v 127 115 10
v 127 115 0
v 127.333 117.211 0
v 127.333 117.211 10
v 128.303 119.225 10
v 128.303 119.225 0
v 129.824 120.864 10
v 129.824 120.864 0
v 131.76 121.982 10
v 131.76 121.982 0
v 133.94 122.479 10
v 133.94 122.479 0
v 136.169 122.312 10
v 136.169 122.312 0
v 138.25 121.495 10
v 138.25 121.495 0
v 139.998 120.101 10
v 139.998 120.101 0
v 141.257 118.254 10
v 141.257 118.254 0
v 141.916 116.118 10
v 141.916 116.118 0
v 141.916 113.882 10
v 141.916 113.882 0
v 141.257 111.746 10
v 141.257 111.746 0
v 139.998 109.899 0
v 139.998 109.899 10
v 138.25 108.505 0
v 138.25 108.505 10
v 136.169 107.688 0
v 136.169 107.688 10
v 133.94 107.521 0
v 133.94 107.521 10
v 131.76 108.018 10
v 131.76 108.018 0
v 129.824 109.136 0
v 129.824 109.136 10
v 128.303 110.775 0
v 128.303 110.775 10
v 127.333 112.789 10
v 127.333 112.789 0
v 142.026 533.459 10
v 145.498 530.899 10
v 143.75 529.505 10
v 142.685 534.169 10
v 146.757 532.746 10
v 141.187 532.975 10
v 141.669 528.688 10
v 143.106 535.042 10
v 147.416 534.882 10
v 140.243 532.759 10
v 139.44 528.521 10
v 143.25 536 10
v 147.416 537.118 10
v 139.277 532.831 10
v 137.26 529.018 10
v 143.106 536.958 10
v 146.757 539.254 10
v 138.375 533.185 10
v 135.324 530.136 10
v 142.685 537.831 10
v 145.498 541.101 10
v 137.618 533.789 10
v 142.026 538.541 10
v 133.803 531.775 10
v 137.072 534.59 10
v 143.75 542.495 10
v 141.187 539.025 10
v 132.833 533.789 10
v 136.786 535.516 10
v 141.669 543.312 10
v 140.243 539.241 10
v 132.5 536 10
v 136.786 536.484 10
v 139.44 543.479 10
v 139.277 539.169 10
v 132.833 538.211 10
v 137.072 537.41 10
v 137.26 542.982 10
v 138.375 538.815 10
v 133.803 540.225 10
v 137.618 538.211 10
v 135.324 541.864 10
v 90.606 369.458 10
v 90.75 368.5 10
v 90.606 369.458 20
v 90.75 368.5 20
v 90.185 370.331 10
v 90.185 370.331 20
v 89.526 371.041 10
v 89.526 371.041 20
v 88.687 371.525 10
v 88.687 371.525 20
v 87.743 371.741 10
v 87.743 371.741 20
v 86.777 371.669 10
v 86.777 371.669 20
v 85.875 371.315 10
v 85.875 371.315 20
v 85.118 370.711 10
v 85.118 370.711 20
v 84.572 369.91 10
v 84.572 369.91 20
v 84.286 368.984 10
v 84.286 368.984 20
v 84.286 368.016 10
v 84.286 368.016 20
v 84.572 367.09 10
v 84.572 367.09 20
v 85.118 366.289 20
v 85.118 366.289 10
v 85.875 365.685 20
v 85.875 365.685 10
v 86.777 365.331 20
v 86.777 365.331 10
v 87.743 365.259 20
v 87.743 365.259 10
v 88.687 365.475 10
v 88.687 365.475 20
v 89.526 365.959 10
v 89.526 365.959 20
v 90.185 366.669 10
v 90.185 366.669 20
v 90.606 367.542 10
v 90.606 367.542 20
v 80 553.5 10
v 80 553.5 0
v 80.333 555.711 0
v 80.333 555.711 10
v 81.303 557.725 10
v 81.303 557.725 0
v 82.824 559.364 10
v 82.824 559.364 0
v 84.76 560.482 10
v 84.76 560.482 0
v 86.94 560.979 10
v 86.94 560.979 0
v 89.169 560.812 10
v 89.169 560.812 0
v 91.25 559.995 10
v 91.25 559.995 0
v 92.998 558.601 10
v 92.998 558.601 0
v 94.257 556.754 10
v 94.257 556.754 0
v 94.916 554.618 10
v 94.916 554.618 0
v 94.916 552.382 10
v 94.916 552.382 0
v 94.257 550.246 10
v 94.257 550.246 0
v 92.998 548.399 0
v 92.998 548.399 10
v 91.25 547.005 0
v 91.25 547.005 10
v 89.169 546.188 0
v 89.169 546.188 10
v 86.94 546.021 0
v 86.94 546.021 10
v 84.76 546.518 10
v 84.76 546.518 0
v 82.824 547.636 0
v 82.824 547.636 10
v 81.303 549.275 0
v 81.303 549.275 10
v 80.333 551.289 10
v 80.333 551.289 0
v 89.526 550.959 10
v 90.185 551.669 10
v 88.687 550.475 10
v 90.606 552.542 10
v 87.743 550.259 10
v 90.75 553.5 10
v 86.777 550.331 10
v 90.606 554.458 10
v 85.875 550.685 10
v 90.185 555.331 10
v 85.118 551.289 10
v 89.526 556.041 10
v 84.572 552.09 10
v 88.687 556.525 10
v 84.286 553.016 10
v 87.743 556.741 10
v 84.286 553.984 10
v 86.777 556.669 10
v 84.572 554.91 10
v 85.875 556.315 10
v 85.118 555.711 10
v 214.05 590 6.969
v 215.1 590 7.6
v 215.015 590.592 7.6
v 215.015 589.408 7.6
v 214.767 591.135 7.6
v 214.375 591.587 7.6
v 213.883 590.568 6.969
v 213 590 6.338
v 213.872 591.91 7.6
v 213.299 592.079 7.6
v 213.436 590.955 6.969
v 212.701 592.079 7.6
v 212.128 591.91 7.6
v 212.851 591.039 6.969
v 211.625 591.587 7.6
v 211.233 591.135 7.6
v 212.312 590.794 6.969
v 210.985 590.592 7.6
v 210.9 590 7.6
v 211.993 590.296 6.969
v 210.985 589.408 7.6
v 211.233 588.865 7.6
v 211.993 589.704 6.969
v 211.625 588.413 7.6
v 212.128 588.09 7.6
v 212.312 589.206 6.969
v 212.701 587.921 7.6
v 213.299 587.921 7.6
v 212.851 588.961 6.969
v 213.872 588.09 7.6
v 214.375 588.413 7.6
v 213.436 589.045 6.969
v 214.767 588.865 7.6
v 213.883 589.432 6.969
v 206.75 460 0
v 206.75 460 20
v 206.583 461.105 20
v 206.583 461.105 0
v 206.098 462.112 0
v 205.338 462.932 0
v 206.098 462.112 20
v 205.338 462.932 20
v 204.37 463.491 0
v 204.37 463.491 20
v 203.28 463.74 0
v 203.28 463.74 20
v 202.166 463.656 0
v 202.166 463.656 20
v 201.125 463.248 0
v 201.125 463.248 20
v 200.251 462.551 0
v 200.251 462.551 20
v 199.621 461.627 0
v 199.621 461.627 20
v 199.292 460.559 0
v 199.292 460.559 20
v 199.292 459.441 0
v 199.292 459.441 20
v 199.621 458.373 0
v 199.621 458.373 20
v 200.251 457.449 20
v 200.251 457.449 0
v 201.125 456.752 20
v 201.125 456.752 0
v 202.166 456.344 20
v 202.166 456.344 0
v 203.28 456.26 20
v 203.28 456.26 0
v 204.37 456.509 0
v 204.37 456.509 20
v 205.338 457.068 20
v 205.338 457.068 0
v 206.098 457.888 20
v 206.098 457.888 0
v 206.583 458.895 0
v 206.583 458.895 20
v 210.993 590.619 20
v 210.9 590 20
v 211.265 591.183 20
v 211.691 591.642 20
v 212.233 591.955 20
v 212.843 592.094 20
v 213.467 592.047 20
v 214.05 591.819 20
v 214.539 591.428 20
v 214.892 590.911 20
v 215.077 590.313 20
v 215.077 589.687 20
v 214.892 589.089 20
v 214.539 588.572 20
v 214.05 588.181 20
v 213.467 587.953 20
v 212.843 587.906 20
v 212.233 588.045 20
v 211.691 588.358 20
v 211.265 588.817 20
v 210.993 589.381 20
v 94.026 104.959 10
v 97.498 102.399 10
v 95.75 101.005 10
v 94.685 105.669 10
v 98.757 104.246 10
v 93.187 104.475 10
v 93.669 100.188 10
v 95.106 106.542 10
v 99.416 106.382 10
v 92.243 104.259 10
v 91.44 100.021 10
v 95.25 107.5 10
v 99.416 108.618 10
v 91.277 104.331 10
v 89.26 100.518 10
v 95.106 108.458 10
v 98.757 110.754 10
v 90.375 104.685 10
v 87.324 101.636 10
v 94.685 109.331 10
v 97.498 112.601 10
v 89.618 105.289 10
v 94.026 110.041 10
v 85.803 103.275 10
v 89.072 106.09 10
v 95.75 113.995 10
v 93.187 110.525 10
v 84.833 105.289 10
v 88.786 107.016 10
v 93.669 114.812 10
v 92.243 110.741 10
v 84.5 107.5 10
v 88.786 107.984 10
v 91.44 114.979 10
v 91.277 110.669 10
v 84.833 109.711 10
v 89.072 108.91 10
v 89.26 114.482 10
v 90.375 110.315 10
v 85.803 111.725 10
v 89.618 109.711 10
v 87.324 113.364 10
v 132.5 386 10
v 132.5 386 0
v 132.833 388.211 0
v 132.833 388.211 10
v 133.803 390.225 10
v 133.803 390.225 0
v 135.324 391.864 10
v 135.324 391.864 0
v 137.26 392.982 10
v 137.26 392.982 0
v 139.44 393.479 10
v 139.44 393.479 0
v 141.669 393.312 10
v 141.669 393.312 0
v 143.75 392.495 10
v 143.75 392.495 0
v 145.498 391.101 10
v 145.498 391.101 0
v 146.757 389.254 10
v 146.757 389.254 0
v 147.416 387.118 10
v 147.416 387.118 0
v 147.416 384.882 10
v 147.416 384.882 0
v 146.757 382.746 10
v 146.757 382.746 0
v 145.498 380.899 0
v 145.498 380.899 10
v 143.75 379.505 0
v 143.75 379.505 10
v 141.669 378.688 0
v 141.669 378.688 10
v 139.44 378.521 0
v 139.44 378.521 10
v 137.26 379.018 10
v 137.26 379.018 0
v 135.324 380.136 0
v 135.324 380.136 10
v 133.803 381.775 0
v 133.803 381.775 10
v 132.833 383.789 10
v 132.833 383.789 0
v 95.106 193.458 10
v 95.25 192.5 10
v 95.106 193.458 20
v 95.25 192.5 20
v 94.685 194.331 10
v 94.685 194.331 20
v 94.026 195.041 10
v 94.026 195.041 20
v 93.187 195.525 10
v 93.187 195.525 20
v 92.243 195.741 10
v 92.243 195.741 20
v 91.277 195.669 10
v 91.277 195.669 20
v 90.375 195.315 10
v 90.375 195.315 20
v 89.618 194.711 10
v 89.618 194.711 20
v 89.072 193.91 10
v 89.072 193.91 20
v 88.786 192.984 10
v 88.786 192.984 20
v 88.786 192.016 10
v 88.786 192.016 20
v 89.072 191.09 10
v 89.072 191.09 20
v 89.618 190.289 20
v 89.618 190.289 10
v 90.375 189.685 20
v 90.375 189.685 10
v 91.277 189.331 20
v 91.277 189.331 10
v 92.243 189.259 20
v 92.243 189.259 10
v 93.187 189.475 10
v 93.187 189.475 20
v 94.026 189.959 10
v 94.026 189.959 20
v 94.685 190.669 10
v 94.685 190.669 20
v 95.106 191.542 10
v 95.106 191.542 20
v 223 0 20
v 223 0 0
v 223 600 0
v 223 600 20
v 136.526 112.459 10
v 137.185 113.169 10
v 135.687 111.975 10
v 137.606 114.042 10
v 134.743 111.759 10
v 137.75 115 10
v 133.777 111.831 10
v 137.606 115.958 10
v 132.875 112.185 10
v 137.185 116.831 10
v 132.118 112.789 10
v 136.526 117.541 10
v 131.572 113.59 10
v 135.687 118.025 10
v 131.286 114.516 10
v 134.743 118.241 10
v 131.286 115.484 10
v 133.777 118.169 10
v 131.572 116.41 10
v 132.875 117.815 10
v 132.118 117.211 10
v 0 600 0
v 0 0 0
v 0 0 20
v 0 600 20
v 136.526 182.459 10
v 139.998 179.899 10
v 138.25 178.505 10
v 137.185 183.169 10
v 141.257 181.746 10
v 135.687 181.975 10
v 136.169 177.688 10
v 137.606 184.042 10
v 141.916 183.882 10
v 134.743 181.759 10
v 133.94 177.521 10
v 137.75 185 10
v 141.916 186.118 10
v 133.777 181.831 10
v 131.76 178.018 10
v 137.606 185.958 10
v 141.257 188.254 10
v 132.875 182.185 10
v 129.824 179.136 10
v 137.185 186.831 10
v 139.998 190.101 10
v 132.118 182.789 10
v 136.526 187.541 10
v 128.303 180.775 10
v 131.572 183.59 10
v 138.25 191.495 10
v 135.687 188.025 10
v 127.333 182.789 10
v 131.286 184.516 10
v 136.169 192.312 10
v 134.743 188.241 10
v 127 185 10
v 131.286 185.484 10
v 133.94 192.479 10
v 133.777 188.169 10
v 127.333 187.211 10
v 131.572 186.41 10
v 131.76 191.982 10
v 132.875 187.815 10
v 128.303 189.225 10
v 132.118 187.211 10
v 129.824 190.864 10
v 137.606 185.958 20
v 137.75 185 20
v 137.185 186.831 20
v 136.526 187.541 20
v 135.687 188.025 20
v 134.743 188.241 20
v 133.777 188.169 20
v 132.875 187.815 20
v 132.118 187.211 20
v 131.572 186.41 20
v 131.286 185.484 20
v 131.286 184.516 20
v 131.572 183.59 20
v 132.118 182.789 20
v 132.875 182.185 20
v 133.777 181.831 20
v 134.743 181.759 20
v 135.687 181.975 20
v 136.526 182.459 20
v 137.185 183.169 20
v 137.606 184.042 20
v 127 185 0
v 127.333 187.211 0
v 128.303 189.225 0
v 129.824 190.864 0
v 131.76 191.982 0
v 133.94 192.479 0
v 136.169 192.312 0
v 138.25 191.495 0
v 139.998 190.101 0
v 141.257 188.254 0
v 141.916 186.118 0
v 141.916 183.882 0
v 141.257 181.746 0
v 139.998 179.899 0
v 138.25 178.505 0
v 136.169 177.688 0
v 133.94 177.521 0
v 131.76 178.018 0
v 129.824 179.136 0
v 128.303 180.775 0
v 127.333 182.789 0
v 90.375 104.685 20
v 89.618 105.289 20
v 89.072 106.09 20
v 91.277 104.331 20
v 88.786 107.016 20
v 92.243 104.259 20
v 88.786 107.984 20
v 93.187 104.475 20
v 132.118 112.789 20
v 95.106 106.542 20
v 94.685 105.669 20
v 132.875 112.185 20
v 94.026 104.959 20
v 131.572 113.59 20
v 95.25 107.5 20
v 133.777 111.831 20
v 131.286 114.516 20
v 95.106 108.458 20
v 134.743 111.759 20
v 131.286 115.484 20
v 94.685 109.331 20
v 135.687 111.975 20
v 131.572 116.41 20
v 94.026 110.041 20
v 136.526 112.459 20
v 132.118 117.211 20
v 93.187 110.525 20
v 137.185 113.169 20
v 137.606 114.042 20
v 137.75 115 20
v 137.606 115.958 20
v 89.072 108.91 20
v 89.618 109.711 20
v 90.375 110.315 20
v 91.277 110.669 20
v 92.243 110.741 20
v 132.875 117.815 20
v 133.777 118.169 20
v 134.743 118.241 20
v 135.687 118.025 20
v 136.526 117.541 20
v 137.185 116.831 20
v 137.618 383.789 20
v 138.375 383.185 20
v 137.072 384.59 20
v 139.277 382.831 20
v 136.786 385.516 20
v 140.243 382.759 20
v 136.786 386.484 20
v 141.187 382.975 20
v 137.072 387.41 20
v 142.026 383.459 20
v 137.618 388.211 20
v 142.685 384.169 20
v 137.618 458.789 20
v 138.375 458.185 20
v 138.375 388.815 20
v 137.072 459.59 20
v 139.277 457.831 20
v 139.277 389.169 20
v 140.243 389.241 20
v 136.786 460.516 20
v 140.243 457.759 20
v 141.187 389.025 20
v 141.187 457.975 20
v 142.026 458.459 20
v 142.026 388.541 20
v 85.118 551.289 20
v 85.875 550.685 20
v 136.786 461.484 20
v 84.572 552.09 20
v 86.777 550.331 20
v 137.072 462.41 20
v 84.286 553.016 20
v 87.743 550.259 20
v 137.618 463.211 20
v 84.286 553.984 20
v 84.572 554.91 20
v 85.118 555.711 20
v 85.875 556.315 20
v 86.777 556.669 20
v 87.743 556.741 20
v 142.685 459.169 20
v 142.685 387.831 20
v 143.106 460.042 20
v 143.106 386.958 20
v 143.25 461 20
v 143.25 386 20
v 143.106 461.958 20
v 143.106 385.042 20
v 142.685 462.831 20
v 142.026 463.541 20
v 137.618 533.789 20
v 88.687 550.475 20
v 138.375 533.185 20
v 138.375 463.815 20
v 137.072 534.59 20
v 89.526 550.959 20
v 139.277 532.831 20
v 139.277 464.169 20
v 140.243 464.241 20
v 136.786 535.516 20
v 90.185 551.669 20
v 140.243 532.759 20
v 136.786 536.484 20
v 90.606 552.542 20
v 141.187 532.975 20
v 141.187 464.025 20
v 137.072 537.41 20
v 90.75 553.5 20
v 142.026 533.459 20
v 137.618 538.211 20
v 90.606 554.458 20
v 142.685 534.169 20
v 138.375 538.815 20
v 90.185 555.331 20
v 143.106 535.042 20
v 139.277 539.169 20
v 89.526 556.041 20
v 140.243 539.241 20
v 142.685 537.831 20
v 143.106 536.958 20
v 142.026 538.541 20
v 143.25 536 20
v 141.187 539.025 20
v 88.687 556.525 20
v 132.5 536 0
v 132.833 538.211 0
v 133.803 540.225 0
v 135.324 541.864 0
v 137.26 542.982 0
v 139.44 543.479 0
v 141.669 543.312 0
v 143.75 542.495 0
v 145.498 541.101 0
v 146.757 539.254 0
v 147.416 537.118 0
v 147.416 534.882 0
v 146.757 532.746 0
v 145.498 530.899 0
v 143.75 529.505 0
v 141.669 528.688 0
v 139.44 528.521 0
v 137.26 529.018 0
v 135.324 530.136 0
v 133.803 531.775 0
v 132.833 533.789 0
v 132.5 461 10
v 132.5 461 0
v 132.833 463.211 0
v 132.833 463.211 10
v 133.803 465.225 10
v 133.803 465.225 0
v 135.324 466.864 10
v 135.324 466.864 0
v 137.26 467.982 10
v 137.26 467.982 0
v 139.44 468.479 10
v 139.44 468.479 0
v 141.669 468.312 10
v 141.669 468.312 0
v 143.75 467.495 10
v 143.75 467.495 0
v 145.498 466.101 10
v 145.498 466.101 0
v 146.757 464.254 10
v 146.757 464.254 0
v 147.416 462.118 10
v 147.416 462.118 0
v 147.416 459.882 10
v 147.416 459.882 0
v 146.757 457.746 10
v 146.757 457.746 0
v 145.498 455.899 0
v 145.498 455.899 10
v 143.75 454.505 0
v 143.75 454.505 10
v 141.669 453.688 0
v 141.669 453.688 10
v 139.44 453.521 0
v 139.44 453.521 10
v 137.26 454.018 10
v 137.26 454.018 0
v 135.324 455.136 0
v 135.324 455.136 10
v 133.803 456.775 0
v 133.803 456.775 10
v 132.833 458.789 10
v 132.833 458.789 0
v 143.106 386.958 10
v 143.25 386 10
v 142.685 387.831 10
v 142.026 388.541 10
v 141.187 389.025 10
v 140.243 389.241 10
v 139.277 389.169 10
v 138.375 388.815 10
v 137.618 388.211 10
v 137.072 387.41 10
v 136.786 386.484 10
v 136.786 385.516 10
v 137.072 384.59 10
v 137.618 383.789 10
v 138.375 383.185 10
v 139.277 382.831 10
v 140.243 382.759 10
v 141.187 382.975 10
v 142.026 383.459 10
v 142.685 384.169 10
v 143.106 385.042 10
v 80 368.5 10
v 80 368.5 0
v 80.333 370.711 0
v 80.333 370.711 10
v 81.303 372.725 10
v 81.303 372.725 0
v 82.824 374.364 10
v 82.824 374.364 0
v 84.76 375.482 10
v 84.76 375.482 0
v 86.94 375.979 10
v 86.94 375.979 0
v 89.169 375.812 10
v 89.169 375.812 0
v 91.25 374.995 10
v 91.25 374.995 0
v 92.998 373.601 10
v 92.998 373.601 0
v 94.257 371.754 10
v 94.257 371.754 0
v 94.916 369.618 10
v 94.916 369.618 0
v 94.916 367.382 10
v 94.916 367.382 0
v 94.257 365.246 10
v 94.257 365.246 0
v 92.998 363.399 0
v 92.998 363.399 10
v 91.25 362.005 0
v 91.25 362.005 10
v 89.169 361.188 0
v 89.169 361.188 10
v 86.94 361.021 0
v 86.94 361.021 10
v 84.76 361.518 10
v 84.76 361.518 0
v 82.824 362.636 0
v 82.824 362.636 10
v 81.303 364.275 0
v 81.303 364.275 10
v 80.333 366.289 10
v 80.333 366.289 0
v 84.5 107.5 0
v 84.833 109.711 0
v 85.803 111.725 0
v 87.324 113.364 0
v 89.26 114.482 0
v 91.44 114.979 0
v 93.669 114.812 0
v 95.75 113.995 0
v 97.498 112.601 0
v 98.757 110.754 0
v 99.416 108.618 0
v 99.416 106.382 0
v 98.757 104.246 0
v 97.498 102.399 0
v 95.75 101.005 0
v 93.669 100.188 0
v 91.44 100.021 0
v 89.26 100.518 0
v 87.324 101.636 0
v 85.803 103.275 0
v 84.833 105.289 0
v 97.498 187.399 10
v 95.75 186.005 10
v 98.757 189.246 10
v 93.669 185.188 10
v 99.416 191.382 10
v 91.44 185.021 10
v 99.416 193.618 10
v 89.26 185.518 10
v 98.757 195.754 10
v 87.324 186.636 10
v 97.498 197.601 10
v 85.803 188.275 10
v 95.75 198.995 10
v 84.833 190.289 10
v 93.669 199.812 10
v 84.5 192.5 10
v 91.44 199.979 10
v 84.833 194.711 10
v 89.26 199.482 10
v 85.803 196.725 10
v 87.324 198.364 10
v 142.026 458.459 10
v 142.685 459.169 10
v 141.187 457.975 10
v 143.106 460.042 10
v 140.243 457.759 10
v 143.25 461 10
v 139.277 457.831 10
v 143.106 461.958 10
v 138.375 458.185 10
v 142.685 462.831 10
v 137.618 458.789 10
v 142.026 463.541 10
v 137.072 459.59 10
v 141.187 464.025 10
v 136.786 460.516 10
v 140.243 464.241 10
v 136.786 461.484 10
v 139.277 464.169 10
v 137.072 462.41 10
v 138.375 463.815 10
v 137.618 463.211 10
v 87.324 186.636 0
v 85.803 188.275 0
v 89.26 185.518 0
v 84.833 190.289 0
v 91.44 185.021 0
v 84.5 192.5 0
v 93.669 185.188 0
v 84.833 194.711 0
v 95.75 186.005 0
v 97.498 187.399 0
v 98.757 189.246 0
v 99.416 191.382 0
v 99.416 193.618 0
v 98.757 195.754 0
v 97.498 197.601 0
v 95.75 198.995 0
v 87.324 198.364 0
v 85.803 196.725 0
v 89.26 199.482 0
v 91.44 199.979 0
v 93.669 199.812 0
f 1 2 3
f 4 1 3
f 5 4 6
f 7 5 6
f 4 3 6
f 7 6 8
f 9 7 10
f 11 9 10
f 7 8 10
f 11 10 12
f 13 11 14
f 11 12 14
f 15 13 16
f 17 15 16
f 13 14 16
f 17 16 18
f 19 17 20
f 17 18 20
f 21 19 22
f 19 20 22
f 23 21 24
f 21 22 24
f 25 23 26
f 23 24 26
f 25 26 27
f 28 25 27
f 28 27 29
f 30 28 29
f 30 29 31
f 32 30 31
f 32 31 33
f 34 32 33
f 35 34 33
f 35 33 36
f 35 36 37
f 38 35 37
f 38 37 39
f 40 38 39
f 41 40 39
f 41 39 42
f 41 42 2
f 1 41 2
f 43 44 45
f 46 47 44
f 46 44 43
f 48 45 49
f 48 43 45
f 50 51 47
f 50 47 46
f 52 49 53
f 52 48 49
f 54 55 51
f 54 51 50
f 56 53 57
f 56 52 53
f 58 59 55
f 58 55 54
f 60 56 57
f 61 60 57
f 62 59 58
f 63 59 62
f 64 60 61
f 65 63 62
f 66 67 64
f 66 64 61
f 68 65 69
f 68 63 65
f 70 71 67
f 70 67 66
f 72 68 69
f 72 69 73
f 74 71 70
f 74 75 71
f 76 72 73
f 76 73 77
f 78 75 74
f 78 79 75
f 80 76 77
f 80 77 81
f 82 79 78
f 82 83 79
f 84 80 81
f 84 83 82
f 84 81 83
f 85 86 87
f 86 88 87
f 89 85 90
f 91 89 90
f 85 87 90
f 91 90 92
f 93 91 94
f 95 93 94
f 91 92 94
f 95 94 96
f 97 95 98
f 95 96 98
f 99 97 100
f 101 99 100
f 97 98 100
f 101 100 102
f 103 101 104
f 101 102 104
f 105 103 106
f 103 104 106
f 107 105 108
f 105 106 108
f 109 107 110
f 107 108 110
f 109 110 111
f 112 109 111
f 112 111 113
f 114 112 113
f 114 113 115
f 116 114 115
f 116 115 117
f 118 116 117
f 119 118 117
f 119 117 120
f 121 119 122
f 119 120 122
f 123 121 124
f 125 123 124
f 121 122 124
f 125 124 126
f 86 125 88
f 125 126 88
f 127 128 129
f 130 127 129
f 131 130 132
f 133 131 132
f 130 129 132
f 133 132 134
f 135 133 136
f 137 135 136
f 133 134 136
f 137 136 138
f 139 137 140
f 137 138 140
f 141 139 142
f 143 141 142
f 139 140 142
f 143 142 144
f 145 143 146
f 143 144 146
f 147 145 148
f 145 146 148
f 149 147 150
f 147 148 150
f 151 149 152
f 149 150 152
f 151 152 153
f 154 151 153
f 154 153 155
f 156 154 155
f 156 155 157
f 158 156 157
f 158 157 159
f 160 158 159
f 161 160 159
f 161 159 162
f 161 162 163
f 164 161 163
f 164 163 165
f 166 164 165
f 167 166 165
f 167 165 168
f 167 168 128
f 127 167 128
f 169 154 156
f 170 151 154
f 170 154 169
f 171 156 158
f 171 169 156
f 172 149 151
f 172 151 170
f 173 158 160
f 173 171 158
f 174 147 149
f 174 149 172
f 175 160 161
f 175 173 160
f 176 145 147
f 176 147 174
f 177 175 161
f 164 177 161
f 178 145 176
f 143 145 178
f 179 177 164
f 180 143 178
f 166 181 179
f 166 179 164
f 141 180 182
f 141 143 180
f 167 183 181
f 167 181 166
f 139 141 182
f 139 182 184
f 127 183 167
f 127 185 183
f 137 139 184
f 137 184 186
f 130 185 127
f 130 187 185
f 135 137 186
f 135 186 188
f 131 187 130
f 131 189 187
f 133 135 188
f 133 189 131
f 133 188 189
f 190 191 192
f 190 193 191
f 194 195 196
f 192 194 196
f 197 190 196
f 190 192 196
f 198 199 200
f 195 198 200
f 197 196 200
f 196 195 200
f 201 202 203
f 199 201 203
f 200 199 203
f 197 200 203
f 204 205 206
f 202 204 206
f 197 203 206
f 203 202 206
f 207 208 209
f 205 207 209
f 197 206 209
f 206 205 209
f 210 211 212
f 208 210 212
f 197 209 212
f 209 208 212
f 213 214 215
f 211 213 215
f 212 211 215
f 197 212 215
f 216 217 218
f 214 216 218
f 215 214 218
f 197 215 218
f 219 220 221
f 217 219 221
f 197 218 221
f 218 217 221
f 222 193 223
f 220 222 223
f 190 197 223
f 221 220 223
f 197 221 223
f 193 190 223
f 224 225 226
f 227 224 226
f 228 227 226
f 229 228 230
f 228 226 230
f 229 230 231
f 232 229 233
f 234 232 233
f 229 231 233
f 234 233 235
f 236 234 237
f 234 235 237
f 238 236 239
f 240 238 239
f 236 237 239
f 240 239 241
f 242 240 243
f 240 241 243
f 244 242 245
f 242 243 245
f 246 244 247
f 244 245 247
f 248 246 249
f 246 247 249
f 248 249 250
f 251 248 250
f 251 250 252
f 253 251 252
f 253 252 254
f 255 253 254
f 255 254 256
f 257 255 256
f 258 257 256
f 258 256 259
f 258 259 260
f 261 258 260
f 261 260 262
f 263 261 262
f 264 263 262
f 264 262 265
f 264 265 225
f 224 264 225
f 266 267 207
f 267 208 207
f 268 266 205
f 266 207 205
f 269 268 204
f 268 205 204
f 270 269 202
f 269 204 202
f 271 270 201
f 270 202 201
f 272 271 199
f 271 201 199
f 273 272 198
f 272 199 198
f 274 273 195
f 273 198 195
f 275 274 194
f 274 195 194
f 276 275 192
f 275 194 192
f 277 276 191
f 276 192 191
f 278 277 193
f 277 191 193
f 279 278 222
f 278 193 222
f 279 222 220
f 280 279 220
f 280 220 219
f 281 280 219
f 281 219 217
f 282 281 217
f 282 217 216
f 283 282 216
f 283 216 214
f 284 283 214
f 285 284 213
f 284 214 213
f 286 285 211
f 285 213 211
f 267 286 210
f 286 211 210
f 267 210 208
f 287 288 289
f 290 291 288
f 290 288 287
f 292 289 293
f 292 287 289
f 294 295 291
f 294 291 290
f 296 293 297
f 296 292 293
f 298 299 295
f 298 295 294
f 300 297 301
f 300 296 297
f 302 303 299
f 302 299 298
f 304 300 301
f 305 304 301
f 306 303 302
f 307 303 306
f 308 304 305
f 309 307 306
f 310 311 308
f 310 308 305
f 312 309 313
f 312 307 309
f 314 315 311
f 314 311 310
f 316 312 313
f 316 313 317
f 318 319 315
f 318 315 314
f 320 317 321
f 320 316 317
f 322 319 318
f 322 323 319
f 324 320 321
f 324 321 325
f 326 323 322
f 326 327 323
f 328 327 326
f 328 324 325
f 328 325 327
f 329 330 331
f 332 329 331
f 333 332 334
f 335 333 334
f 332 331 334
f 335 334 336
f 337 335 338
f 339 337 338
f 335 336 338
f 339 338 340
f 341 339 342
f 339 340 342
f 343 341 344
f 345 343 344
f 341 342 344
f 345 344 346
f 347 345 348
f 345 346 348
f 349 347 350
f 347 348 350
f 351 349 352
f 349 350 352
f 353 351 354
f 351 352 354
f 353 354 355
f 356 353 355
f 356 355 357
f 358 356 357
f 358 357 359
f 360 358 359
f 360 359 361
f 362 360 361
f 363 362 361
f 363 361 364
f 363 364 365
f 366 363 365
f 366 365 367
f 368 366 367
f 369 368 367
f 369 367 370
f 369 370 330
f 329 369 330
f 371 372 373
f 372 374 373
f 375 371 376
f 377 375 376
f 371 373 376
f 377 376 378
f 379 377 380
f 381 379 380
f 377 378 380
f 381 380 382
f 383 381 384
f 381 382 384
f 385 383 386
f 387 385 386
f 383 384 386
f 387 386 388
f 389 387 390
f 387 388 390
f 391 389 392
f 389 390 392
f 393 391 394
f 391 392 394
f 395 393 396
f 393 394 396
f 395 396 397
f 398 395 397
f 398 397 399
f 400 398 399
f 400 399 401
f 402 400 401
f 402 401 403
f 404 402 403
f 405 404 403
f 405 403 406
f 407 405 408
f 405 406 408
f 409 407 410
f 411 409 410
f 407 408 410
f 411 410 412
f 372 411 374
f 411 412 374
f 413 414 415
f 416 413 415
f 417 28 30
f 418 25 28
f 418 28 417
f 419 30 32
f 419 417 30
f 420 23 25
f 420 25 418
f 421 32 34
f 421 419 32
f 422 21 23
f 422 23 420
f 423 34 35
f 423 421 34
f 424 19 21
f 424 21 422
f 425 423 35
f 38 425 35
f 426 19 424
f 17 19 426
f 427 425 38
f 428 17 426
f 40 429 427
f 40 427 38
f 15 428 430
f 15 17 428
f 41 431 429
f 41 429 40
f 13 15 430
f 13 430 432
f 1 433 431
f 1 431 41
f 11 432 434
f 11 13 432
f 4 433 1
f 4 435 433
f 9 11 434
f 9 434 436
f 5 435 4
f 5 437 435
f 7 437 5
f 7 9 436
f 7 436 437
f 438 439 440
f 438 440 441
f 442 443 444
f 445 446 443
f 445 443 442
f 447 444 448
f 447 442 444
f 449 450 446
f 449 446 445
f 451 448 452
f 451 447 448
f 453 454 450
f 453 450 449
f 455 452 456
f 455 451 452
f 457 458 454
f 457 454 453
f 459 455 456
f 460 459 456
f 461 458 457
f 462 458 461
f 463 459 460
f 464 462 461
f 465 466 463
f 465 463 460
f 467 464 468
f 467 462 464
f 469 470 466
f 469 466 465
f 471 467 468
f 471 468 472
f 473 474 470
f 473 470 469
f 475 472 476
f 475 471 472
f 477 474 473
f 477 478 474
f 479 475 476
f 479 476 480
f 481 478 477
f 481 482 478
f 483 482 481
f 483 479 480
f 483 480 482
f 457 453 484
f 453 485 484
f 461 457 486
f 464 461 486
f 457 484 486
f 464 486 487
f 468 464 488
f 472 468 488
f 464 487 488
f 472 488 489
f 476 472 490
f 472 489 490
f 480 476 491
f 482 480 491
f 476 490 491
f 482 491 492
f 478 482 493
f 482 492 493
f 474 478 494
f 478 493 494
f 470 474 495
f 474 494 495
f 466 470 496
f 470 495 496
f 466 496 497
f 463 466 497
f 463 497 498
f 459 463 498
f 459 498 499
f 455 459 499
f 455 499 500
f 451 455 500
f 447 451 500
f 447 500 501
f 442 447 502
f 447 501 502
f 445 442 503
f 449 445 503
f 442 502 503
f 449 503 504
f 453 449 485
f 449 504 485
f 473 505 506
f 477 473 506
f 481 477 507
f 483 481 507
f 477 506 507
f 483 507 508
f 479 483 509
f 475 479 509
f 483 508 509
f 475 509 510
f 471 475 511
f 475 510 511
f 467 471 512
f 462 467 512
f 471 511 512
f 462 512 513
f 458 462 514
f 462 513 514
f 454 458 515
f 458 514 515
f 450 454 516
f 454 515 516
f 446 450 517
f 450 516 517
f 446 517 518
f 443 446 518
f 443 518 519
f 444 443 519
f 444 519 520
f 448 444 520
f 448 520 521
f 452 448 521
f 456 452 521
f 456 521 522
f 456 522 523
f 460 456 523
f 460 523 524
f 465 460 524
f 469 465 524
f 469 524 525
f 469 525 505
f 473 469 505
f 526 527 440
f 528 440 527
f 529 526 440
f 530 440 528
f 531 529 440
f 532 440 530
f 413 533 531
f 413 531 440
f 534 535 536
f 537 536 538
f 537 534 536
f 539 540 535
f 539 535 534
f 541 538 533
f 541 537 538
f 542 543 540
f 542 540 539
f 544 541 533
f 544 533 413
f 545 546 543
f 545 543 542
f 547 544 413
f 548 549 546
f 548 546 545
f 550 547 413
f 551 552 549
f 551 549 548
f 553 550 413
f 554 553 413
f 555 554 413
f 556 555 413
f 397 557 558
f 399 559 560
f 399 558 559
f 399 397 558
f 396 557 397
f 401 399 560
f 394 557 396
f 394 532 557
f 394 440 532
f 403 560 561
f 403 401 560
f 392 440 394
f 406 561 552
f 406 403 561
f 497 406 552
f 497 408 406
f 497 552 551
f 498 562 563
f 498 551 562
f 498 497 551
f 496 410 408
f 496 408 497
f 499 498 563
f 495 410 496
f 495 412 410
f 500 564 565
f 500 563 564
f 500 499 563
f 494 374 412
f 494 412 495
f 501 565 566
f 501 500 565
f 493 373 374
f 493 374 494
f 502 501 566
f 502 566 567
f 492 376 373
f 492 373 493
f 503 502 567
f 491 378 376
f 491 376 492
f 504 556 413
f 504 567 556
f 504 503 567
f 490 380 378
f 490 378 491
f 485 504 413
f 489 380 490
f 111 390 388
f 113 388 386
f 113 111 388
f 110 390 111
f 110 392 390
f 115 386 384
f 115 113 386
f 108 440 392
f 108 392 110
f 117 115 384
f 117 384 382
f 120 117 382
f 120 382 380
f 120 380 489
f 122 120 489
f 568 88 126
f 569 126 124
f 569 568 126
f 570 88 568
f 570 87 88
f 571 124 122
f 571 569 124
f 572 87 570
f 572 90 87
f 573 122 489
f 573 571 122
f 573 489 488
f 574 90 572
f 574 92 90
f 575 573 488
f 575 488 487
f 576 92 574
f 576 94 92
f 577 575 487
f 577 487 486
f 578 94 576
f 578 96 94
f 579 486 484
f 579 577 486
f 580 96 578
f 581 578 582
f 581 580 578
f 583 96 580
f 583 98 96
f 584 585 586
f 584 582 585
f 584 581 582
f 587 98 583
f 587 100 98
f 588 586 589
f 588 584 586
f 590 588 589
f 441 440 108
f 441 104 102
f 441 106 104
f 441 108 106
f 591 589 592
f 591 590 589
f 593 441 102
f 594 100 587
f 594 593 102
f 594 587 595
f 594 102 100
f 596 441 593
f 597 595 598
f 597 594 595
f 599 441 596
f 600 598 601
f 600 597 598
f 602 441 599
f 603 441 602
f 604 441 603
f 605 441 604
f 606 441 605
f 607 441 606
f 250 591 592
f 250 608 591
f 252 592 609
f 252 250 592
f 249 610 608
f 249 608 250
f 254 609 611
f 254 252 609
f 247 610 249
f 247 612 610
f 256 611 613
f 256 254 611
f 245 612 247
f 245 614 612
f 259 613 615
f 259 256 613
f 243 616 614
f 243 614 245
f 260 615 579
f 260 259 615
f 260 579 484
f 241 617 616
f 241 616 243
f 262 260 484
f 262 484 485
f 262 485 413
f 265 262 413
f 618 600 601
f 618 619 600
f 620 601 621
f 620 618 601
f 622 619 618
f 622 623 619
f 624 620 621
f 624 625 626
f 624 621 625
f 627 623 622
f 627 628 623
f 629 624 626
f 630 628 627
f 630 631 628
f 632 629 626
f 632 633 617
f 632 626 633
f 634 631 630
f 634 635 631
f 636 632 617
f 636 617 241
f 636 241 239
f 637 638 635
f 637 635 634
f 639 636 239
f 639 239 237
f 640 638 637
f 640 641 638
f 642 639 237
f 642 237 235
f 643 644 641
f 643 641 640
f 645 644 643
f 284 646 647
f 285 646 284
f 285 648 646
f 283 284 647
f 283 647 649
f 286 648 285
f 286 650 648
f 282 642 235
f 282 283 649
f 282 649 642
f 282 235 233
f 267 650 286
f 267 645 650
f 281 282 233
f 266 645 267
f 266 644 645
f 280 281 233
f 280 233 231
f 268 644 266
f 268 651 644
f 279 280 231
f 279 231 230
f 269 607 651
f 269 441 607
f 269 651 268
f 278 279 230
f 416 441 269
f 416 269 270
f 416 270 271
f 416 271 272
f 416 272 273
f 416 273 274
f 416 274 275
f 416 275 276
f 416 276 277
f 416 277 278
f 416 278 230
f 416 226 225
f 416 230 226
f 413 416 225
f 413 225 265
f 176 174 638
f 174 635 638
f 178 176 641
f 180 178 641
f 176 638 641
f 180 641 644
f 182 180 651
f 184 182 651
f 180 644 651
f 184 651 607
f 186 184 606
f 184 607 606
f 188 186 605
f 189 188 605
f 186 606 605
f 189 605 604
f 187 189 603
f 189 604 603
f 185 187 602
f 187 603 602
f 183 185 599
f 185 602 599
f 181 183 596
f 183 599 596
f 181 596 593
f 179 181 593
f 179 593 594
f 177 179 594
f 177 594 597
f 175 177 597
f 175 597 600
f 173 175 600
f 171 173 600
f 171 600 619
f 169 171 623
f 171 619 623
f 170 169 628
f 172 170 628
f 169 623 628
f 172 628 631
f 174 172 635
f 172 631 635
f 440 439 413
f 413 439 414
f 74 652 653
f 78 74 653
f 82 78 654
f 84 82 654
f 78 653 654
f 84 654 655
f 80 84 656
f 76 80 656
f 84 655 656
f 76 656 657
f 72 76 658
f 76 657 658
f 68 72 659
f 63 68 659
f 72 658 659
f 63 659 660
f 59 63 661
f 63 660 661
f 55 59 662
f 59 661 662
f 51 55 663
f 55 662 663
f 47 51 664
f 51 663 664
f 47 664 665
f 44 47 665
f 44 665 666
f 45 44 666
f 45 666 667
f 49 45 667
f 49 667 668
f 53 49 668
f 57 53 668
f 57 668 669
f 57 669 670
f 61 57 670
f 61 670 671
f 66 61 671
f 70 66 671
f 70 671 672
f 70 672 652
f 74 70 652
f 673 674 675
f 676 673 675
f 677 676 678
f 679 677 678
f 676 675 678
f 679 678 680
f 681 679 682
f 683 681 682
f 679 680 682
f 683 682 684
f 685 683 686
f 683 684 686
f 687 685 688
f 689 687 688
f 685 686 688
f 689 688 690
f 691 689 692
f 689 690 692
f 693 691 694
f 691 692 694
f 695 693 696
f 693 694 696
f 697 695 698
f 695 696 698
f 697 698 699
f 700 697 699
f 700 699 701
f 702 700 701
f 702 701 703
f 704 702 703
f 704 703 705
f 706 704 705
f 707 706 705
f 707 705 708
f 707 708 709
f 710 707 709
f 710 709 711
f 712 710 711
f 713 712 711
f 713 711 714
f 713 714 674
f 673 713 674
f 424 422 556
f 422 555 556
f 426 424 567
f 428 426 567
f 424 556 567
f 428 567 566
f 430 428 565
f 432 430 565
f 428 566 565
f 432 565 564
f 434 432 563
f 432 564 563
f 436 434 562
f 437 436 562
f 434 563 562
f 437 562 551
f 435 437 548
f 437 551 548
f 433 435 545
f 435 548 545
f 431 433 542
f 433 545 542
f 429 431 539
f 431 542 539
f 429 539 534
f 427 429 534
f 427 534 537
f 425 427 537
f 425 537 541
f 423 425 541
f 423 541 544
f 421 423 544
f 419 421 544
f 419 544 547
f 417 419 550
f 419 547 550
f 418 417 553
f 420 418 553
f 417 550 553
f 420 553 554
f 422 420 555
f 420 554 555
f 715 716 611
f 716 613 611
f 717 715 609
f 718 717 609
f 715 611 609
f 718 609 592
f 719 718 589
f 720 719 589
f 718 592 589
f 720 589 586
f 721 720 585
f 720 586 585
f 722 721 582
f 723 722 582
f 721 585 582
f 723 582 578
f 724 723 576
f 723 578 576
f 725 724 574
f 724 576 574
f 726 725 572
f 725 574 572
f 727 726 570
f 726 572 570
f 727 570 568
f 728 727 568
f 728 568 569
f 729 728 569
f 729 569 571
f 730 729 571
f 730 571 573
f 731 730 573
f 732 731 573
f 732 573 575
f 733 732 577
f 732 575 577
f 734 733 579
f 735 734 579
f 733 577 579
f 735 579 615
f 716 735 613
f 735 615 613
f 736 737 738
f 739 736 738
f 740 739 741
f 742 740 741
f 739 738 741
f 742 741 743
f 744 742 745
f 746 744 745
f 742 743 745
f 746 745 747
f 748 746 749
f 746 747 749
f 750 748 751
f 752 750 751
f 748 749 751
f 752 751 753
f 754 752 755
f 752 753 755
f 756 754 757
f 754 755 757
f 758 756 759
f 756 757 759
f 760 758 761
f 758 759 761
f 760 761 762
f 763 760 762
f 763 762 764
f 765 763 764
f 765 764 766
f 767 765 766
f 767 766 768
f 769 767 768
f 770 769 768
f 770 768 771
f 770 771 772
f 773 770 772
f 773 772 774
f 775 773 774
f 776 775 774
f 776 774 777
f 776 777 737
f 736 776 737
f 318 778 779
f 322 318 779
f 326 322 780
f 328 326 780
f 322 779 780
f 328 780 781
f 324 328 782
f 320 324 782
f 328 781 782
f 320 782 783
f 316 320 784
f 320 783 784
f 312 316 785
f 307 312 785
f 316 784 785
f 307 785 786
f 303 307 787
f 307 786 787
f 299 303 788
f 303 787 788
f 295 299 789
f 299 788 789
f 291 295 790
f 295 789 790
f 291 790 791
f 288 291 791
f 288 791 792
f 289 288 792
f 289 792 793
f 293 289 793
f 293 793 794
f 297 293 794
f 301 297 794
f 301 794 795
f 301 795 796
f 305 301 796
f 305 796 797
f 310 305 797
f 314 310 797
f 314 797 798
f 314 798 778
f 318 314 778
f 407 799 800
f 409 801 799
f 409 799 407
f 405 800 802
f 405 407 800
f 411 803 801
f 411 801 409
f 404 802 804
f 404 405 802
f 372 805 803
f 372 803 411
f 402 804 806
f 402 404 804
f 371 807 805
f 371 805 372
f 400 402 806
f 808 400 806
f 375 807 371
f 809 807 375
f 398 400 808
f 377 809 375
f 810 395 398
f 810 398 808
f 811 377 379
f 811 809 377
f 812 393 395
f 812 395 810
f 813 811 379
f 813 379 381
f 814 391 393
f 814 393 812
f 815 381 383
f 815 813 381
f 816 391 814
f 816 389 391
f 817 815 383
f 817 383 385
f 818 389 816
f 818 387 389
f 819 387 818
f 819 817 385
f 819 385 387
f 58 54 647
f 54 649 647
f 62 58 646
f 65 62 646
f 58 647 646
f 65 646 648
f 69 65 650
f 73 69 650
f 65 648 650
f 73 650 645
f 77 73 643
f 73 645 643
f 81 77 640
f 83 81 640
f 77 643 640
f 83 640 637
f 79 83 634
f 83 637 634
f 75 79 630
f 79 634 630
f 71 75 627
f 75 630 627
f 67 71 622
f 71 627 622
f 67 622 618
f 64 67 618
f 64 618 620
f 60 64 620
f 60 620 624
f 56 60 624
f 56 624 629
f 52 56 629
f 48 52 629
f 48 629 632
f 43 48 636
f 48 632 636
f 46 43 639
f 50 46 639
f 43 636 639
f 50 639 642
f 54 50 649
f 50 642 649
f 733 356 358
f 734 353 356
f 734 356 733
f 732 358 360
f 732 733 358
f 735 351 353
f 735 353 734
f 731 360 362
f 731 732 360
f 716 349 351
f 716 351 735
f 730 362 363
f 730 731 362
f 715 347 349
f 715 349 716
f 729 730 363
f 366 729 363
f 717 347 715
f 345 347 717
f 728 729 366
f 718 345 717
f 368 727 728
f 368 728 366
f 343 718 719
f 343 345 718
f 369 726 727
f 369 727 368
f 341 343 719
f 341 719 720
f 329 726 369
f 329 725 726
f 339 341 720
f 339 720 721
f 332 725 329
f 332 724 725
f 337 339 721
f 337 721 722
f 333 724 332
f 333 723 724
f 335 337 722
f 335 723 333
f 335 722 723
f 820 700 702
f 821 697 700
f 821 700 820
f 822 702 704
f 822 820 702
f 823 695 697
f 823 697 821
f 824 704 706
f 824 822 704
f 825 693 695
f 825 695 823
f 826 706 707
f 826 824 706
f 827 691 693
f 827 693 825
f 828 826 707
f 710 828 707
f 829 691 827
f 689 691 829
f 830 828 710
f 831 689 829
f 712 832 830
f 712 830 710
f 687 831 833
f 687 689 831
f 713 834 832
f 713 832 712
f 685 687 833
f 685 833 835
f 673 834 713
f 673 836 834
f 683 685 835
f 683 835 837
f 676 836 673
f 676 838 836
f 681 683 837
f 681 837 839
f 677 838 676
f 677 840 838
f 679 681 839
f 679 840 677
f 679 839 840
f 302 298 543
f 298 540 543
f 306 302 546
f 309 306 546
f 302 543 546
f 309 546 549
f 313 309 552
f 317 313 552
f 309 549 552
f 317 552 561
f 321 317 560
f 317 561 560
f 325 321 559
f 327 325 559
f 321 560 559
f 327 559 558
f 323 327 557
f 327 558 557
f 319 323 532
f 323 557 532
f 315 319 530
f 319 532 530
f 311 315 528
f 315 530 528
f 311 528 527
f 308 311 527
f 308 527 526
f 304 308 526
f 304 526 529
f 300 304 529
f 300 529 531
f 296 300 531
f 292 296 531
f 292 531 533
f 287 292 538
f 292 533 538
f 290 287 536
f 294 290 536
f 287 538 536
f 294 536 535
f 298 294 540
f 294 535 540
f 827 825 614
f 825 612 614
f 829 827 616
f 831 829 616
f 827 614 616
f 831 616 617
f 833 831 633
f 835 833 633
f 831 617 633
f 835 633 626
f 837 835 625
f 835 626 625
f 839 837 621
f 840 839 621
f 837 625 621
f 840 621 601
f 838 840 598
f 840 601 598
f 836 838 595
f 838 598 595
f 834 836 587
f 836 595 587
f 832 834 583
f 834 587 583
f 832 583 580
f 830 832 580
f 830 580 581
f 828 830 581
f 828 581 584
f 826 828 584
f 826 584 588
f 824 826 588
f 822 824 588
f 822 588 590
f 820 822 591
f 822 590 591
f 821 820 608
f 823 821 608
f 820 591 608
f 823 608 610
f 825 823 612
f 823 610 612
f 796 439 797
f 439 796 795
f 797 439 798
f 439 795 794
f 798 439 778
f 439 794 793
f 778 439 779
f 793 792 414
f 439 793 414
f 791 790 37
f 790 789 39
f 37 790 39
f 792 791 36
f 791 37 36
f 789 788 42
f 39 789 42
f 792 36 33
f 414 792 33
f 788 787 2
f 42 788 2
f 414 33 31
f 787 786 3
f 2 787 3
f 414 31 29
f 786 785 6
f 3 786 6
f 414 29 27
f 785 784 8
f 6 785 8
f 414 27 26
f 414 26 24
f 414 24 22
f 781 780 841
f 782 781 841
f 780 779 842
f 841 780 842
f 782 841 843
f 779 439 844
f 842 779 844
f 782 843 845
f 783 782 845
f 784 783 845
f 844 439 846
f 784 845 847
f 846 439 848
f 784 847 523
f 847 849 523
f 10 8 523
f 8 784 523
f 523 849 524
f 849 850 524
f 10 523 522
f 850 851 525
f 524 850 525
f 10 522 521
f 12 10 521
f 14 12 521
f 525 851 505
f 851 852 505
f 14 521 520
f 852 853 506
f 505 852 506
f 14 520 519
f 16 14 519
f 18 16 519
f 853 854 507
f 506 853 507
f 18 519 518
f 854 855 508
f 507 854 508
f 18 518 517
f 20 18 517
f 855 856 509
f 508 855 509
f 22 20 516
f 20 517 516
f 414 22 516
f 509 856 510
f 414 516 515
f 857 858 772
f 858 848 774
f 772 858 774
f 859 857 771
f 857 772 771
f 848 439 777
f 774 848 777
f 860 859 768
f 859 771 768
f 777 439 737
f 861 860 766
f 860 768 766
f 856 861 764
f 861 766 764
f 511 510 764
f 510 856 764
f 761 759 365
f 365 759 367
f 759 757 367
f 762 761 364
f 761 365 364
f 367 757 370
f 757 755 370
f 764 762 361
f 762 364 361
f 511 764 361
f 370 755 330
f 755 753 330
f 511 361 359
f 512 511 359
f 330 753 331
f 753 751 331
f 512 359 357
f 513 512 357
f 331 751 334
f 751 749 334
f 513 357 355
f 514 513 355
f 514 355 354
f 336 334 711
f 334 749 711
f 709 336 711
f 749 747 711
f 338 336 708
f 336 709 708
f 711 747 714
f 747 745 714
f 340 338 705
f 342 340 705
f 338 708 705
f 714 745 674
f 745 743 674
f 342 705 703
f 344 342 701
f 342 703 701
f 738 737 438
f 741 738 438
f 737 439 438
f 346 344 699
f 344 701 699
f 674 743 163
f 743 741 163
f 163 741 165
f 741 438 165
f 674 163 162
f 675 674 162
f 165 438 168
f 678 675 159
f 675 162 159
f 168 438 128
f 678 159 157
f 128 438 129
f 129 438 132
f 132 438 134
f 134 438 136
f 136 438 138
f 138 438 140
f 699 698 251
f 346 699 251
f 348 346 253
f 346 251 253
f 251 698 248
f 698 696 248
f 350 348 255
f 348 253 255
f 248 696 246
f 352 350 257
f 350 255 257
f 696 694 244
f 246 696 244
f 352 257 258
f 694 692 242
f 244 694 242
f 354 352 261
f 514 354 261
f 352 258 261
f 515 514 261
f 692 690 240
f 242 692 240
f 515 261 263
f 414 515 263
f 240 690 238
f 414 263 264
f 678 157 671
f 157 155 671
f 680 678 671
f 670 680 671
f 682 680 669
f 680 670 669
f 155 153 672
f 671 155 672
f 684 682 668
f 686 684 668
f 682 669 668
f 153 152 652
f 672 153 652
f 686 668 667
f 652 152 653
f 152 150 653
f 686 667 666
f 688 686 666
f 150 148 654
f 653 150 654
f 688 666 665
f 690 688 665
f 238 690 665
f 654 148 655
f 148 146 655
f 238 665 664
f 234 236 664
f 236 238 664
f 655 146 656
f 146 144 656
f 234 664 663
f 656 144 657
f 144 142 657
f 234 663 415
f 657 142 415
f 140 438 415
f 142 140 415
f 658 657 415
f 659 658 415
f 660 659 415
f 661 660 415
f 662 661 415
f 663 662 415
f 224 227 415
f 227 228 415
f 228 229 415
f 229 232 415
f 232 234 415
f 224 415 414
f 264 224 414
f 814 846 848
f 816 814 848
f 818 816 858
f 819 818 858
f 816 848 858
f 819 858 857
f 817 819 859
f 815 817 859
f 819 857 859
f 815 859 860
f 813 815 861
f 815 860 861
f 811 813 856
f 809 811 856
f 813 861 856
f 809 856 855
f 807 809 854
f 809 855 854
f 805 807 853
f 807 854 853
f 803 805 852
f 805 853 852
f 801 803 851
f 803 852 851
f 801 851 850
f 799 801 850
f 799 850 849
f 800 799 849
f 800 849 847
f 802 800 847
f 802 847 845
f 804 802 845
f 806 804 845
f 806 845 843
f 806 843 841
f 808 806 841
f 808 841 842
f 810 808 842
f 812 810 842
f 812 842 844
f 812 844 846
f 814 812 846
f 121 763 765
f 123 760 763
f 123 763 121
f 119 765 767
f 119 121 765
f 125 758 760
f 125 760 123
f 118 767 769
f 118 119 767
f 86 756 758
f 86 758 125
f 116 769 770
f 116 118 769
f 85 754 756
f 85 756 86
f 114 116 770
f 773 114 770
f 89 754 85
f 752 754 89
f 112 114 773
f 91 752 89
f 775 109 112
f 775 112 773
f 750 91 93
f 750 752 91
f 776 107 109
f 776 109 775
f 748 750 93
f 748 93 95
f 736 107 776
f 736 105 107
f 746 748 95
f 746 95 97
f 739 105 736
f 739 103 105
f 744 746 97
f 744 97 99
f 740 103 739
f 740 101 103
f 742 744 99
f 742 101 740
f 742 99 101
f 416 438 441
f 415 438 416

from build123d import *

# Parameters (mm, degrees)
SKETCH1_W                                           = 223
SKETCH1_H                                           = 600
BOSS_EXTRUDE1_DEPTH                                 = 20
CBORE_FOR_M6_HEX_SOCKET_HEAD_CAP_SCREW1_D           = 6.5
CBORE_FOR_M6_HEX_SOCKET_HEAD_CAP_SCREW1_CBORE_D     = 15
CBORE_FOR_M6_HEX_SOCKET_HEAD_CAP_SCREW1_CBORE_DEPTH = 10
CBORE_FOR_M6_HEX_SOCKET_HEAD_CAP_SCREW2_D           = 6.5
CBORE_FOR_M6_HEX_SOCKET_HEAD_CAP_SCREW2_CBORE_D     = 15
CBORE_FOR_M6_HEX_SOCKET_HEAD_CAP_SCREW2_CBORE_DEPTH = 10
SKETCH6_R                                           = 3.75
CUT_EXTRUDE1_DEPTH                                  = 641.413147898
M5_TAPPED_HOLE1_D                                   = 4.2
M5_TAPPED_HOLE1_DEPTH                               = 12.4
M5_TAPPED_HOLE1_TIP                                 = 1.2618073


with BuildPart() as part:
    # Sketch1 → Boss-Extrude1 (new body)
    with BuildSketch(Plane.XY):
        with Locations((111.5, 300)):
            Rectangle(SKETCH1_W, SKETCH1_H)
    extrude(amount=BOSS_EXTRUDE1_DEPTH)

    # CBORE for M6 Hex Socket Head Cap Screw1 (through all)
    with Locations(Plane(origin=(0, 0, 0), x_dir=(-1, 0, 0), z_dir=(0, 0, -1))):
        with Locations((-134.5, 115), (-134.5, 185), (-92, 107.5), (-92, 192.5)):
            CounterBoreHole(CBORE_FOR_M6_HEX_SOCKET_HEAD_CAP_SCREW1_D / 2, CBORE_FOR_M6_HEX_SOCKET_HEAD_CAP_SCREW1_CBORE_D / 2, CBORE_FOR_M6_HEX_SOCKET_HEAD_CAP_SCREW1_CBORE_DEPTH)

    # CBORE for M6 Hex Socket Head Cap Screw2 (through all)
    with Locations(Plane(origin=(0, 0, 0), x_dir=(-1, 0, 0), z_dir=(0, 0, -1))):
        with Locations((-87.5, 368.5), (-87.5, 553.5), (-140, 386), (-140, 461), (-140, 536)):
            CounterBoreHole(CBORE_FOR_M6_HEX_SOCKET_HEAD_CAP_SCREW2_D / 2, CBORE_FOR_M6_HEX_SOCKET_HEAD_CAP_SCREW2_CBORE_D / 2, CBORE_FOR_M6_HEX_SOCKET_HEAD_CAP_SCREW2_CBORE_DEPTH)

    # Sketch6 → Cut-Extrude1 (cut, through all)
    with BuildSketch(Plane.XY.offset(20)):
        with Locations((203, 460)):
            Circle(SKETCH6_R)
    extrude(amount=-CUT_EXTRUDE1_DEPTH, mode=Mode.SUBTRACT)

    # M5 Tapped Hole1
    with Locations(Plane.XY.offset(20)):
        with Locations((213, 590)):
            Hole(M5_TAPPED_HOLE1_D / 2, depth=M5_TAPPED_HOLE1_DEPTH)
            with Locations((0, 0, -(M5_TAPPED_HOLE1_DEPTH + M5_TAPPED_HOLE1_TIP / 2))):  # 118° drill point
                Cone(0, M5_TAPPED_HOLE1_D / 2, M5_TAPPED_HOLE1_TIP, mode=Mode.SUBTRACT)


solid = part.part
